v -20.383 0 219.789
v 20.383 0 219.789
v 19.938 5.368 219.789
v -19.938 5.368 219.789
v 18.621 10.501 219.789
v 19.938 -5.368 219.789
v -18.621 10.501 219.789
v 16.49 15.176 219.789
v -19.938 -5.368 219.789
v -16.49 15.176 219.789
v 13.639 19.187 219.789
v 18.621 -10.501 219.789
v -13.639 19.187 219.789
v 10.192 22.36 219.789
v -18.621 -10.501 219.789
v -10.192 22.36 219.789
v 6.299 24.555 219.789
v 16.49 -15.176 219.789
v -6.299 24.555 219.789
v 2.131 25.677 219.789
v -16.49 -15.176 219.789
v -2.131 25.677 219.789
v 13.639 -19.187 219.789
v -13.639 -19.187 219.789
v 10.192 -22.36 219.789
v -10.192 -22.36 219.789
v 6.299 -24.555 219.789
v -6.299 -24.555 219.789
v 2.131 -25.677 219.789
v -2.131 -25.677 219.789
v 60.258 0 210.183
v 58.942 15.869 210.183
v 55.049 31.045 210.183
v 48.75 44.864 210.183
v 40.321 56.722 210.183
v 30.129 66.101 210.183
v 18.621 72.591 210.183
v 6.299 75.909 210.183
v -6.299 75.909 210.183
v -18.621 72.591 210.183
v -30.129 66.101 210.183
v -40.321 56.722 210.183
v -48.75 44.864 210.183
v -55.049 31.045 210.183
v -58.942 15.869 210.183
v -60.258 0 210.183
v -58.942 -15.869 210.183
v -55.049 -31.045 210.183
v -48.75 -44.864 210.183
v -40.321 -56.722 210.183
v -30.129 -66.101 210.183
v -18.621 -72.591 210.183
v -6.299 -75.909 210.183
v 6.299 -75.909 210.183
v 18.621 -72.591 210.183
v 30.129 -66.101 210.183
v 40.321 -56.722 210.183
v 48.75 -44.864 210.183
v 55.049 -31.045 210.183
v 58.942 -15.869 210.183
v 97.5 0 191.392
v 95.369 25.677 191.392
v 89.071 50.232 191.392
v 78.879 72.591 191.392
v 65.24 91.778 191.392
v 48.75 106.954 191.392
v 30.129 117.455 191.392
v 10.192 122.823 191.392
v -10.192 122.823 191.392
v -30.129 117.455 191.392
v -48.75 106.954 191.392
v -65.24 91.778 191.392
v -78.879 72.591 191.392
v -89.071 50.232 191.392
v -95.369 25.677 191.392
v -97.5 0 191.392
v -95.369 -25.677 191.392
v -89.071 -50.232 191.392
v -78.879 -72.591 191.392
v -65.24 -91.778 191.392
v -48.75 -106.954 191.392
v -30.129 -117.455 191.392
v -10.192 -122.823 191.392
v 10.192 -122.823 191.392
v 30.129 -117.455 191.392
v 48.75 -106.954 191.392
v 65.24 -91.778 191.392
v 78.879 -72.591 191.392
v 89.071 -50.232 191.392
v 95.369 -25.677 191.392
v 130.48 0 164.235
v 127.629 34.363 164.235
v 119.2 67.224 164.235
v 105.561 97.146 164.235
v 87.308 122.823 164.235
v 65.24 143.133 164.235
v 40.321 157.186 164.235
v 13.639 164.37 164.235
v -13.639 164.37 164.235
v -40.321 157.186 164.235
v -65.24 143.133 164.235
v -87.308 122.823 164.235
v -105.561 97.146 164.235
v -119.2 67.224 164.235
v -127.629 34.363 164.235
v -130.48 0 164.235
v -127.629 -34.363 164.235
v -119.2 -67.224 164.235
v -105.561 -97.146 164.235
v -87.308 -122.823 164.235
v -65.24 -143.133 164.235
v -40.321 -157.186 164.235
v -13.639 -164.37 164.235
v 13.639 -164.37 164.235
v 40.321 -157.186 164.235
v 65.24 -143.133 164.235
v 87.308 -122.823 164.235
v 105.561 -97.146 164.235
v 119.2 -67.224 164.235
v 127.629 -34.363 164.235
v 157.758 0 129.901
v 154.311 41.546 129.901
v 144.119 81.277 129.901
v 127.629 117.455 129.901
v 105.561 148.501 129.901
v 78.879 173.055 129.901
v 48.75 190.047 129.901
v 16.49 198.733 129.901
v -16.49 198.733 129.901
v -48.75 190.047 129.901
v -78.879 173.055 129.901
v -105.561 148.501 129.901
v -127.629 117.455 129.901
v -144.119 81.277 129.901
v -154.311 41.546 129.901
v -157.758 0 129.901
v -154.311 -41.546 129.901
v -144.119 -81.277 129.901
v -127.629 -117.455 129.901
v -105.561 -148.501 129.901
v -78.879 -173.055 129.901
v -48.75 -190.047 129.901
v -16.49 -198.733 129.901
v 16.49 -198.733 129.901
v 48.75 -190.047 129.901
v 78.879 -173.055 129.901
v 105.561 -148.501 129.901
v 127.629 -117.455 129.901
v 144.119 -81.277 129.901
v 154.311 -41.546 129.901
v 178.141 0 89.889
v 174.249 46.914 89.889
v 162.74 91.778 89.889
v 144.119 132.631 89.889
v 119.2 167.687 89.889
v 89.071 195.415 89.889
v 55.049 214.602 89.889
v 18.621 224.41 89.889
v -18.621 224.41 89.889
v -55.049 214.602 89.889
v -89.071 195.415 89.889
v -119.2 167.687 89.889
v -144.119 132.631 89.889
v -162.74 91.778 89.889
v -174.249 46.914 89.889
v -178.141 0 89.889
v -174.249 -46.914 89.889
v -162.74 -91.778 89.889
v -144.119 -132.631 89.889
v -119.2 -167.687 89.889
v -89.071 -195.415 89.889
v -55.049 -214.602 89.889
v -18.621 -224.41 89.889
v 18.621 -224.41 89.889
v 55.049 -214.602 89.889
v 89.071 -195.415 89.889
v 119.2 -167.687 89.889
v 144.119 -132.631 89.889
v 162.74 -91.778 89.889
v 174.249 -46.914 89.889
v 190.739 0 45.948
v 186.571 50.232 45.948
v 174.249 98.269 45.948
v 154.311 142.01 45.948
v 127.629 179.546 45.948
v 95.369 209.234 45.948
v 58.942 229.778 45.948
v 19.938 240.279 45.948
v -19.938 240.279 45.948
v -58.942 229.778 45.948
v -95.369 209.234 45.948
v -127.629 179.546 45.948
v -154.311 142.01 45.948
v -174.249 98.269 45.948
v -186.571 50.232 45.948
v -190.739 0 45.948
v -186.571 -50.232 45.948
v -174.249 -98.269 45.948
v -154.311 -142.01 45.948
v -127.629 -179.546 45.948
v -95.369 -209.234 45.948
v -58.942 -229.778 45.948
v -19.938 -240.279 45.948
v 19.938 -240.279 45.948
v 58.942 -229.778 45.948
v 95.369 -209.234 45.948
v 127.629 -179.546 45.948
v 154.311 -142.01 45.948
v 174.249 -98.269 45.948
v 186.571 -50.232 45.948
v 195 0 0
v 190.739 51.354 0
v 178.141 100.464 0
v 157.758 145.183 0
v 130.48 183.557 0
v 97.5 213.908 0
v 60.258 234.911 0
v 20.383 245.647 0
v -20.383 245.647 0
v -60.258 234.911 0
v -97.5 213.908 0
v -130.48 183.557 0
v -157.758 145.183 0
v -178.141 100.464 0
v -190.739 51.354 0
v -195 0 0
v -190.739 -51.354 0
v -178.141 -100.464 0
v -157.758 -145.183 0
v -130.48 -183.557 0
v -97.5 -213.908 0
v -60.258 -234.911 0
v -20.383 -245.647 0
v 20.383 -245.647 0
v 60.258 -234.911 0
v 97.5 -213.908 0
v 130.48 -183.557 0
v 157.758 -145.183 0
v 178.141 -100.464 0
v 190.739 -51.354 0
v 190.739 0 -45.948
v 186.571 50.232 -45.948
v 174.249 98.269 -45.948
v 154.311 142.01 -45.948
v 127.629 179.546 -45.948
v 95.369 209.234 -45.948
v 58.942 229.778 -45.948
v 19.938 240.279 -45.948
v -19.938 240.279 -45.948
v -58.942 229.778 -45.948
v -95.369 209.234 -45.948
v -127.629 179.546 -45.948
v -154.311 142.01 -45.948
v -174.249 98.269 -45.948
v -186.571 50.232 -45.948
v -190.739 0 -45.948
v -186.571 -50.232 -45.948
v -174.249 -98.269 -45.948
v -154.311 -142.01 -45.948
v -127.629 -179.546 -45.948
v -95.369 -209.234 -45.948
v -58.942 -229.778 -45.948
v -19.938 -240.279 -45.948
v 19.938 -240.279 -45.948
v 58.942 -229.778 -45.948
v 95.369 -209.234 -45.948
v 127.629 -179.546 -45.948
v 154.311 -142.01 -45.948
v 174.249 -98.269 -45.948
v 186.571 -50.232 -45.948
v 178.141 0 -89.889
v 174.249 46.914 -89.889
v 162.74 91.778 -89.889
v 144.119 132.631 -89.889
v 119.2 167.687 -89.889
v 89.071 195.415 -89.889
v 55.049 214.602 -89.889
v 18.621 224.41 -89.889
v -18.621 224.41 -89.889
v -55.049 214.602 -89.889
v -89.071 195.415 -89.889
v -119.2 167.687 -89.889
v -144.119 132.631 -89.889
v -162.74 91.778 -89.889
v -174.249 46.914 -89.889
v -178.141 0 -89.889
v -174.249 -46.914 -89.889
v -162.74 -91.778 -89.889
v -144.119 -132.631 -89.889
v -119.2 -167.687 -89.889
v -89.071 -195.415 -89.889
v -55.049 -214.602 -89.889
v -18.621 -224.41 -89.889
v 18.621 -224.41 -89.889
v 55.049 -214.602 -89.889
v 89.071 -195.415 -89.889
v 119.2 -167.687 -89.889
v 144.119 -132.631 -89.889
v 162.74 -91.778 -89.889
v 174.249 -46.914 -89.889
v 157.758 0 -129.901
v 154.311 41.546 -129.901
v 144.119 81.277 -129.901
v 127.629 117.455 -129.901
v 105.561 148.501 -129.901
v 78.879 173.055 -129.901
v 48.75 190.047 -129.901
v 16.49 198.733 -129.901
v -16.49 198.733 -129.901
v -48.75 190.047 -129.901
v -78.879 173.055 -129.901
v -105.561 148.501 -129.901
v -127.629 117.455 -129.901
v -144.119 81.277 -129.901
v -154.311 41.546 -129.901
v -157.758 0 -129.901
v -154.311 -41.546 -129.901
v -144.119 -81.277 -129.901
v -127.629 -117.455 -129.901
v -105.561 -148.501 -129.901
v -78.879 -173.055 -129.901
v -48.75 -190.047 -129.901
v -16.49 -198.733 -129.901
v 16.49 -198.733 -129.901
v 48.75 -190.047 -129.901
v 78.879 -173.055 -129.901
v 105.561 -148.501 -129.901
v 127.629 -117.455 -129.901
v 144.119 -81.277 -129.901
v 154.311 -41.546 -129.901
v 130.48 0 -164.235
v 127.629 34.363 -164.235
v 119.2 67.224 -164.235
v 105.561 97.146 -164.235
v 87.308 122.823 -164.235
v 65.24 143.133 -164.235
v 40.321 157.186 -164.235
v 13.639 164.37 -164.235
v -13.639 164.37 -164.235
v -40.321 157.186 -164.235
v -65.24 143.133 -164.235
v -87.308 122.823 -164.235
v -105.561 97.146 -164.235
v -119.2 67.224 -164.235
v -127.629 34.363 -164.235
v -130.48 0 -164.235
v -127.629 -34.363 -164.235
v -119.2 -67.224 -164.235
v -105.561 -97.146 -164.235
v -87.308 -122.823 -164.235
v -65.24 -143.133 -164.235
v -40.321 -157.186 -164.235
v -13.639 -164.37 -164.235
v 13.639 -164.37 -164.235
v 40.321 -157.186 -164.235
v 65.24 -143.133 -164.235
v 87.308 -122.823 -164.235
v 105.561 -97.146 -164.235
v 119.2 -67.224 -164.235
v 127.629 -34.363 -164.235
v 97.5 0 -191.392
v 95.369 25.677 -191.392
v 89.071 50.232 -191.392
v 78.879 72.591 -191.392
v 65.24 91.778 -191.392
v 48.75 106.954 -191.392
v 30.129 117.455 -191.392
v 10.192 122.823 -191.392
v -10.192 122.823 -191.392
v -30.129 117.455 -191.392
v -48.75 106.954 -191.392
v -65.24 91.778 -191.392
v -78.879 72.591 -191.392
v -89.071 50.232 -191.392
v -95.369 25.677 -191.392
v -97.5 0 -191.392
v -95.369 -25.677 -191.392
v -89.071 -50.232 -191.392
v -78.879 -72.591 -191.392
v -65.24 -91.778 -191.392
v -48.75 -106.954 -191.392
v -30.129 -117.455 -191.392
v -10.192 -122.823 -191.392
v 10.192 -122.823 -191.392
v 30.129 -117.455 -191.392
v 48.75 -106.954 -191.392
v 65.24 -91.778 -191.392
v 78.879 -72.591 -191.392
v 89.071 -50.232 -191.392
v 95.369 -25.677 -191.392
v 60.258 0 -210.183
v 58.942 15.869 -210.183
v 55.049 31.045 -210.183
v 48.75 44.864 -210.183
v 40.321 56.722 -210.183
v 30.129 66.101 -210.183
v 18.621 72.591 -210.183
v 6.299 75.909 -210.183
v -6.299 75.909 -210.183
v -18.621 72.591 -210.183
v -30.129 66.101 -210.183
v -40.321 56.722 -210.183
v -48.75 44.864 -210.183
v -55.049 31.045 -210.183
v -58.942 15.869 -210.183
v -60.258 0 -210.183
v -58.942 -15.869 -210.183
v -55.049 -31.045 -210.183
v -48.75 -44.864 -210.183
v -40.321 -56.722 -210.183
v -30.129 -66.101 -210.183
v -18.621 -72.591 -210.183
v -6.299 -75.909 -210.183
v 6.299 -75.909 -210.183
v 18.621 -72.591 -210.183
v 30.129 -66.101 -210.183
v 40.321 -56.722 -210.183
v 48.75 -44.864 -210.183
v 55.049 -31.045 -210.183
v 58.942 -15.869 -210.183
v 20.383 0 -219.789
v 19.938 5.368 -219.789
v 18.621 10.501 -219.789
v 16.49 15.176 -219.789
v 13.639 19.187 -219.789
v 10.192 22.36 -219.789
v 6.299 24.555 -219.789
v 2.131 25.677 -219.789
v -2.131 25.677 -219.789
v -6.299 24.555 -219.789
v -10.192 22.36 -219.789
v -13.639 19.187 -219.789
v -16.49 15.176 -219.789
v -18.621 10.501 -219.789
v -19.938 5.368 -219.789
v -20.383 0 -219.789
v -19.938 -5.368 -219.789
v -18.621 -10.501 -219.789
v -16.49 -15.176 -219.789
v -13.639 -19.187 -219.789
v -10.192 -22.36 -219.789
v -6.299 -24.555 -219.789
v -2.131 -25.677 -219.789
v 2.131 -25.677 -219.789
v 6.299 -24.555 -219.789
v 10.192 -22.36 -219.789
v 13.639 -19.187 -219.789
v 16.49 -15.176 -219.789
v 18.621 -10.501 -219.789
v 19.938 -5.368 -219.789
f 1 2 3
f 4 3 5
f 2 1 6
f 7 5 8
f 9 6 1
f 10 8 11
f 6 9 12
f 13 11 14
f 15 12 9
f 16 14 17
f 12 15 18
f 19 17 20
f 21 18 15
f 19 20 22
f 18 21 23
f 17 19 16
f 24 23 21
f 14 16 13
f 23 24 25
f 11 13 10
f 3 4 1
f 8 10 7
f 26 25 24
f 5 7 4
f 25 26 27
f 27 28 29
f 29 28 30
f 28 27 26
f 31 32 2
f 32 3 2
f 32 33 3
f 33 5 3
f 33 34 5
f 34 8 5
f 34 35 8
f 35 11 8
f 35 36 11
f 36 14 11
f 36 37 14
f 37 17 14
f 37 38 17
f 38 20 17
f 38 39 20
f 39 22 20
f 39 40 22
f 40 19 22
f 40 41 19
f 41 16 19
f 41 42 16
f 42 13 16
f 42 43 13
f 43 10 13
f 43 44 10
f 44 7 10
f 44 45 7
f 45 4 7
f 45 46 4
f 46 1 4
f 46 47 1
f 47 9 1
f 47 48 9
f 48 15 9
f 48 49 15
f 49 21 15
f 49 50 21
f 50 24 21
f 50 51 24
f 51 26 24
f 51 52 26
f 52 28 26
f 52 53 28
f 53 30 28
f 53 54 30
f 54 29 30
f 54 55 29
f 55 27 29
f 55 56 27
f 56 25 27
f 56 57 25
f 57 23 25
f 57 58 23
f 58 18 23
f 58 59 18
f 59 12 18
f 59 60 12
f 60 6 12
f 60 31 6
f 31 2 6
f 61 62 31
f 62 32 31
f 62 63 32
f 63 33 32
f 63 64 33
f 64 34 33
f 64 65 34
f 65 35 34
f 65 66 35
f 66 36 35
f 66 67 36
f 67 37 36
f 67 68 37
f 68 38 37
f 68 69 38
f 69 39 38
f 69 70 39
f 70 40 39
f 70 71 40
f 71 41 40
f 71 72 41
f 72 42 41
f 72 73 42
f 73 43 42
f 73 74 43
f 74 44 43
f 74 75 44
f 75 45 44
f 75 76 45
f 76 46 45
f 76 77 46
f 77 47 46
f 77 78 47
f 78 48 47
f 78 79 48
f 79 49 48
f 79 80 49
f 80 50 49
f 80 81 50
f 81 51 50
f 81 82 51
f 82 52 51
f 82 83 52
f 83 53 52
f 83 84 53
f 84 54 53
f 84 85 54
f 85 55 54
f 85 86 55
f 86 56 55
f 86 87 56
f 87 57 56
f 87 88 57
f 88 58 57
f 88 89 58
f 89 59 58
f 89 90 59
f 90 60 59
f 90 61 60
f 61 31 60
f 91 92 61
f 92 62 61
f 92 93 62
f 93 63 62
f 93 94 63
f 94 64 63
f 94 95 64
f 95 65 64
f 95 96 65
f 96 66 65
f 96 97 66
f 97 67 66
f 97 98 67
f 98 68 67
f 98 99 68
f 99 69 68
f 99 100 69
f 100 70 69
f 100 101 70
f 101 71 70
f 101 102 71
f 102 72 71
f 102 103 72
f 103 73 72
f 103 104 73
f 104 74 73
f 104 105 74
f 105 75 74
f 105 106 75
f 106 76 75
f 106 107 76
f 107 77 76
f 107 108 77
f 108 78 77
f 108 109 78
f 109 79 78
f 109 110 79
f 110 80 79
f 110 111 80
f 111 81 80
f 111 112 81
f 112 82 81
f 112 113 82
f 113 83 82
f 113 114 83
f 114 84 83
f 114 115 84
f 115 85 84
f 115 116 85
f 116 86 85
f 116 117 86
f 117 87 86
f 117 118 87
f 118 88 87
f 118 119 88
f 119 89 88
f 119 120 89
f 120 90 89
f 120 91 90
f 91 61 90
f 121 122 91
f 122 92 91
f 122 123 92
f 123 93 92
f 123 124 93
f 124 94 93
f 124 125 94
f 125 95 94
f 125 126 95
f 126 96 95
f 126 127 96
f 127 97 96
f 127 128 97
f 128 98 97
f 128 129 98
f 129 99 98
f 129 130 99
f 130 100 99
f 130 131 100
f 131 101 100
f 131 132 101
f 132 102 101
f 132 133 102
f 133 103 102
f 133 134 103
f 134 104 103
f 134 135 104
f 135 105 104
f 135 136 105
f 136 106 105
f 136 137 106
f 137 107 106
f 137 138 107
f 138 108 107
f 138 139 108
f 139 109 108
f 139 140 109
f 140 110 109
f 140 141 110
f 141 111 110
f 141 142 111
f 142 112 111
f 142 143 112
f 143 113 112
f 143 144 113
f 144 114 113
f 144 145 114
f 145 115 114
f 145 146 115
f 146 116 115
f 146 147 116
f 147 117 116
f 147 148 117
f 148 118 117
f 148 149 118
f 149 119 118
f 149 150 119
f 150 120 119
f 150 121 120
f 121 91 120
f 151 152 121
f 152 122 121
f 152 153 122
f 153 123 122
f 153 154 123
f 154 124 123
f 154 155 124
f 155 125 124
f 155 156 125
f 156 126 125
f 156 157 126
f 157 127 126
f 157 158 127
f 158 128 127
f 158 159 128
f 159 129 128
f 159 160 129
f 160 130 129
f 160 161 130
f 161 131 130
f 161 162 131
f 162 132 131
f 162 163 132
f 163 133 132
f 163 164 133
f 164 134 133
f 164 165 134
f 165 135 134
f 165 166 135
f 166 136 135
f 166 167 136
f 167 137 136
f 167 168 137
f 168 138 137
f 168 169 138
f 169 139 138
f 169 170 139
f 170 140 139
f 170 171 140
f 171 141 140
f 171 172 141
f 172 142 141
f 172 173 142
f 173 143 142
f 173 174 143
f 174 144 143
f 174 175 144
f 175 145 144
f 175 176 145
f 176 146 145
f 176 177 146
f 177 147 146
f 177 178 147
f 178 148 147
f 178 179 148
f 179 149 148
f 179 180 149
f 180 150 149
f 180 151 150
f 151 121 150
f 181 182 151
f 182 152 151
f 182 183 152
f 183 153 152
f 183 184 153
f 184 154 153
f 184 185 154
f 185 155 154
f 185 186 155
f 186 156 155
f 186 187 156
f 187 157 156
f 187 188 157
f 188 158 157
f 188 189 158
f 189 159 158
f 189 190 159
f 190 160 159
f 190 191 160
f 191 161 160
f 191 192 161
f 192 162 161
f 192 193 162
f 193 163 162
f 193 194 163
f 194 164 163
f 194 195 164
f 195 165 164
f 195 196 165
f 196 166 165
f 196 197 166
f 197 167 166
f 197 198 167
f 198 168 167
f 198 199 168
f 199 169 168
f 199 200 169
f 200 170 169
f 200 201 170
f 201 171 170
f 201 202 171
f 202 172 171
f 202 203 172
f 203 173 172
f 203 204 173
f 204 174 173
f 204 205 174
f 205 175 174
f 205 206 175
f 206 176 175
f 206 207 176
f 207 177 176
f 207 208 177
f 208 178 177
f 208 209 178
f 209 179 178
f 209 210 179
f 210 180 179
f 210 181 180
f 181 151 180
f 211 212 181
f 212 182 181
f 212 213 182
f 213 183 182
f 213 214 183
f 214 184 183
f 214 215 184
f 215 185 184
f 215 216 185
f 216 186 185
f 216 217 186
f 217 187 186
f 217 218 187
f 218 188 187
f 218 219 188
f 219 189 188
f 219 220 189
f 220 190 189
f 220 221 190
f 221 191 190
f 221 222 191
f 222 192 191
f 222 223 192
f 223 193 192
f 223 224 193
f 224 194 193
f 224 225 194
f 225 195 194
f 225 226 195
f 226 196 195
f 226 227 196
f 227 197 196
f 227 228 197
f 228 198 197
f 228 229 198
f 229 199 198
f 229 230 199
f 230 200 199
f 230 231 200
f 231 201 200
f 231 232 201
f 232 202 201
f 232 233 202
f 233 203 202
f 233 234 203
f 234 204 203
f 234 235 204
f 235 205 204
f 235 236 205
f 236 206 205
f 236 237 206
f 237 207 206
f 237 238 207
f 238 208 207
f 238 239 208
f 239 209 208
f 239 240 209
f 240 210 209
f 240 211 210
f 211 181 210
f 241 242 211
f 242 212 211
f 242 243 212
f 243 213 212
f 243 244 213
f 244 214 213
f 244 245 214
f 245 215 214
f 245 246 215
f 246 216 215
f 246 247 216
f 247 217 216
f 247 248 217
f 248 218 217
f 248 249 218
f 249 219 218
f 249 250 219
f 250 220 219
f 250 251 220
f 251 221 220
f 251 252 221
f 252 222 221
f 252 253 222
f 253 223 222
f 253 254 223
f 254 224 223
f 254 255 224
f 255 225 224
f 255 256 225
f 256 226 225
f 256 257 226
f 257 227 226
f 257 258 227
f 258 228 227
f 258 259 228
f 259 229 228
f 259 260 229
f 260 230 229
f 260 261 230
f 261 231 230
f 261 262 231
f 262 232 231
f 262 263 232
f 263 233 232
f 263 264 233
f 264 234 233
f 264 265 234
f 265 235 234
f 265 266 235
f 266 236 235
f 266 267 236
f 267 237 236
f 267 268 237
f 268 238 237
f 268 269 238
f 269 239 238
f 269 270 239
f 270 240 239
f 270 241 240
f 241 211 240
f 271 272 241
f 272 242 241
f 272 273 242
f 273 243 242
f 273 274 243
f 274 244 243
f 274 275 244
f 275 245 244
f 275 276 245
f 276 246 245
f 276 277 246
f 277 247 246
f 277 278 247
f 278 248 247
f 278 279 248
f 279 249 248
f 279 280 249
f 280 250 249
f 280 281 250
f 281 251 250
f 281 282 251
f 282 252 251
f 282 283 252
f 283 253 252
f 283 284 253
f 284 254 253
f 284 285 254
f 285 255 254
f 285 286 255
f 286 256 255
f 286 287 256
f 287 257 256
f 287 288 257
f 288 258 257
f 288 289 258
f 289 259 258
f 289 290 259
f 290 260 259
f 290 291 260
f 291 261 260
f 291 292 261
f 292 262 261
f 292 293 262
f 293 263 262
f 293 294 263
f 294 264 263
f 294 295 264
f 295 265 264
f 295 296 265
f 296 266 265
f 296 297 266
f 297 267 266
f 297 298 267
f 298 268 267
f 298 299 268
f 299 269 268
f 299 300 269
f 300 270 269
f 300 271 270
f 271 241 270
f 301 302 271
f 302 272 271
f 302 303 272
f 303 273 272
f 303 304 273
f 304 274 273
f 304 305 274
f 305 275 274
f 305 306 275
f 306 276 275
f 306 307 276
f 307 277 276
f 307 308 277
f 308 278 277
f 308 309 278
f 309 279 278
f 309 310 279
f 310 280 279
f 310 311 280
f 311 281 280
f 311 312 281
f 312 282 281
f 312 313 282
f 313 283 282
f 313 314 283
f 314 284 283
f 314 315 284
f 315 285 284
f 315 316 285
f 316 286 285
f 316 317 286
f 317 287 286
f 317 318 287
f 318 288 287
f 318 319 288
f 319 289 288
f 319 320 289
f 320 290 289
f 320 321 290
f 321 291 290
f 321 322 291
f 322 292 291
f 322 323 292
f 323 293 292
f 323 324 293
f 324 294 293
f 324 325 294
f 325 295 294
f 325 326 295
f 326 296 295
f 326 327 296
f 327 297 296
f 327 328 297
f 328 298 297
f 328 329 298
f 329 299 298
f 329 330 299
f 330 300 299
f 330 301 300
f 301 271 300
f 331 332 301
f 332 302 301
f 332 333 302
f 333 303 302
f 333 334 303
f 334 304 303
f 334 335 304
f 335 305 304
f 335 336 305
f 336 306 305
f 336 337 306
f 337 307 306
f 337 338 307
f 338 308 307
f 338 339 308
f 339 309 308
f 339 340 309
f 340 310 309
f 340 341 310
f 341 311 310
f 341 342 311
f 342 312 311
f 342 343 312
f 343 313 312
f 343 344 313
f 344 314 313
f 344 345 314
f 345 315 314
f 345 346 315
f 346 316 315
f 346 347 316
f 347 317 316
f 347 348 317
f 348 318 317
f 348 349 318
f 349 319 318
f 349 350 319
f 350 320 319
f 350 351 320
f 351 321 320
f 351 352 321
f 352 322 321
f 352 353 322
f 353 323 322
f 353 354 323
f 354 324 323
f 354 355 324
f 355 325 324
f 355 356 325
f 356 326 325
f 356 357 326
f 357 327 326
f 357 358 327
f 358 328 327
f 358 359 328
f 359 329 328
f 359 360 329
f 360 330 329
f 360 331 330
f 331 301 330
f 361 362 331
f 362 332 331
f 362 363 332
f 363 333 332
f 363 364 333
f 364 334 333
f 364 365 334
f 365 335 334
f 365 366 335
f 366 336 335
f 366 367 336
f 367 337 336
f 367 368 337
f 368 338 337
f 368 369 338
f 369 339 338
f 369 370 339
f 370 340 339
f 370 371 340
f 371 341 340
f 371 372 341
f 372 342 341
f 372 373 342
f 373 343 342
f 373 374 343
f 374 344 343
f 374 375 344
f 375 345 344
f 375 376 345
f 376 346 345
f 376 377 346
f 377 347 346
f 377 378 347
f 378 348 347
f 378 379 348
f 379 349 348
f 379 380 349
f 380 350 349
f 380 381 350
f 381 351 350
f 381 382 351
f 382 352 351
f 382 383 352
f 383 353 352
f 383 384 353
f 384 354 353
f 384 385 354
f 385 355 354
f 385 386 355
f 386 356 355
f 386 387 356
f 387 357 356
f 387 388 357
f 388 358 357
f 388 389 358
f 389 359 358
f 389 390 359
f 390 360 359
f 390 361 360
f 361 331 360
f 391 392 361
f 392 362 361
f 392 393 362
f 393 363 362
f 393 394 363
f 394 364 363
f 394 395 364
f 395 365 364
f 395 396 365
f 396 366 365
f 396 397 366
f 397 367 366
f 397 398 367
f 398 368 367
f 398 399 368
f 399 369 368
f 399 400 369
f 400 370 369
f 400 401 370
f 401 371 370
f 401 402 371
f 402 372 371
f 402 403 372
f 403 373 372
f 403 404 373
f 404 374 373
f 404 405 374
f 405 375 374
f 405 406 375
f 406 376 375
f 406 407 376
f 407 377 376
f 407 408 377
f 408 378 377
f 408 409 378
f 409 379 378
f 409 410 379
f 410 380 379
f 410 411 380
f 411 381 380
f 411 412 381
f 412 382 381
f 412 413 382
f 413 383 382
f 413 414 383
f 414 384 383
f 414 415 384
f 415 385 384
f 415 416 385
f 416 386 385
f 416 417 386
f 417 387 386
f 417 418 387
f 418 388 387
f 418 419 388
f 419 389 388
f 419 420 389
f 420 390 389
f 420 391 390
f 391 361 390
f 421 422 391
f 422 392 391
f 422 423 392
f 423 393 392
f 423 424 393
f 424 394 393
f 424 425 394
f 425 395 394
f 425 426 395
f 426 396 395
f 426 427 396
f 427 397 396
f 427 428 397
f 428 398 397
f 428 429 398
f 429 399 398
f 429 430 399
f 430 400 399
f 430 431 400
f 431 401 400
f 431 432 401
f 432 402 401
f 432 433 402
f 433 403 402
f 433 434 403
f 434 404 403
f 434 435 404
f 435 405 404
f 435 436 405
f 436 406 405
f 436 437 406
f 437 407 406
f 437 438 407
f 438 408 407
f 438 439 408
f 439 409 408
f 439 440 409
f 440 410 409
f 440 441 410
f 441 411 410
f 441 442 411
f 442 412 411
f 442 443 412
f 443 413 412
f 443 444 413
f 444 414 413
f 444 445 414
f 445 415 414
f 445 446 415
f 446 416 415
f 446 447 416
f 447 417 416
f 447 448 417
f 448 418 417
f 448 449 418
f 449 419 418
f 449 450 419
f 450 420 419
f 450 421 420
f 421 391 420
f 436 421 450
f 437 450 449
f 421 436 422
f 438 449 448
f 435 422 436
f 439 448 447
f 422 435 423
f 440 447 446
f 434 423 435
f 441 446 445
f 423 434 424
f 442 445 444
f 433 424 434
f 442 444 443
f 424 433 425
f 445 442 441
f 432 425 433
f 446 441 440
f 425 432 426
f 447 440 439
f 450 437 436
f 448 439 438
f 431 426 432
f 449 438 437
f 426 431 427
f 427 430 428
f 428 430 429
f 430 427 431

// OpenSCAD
// Generated by SolidPython 1.0.1 on 2020-07-29 00:46:52


scale(v = [15, 19, 17]) {
	sphere(r = 13);
}
/***********************************************
*********      SolidPython code:      **********
************************************************
 
# import packages: SolidPython
from solid import *
from solid.utils import *
from itertools import chain, combinations, permutations


class Resize:

    def __init__(self, scad_file):
        self.scad_file = scad_file
        #self.scad_file = import_scad(scad_file)
        # cone/cylinder param:
        self.r1 = 0
        self.r2 = 0
        self.h = 0
        # rectangular prism param:
        self.w = 0
        self.l = 0
        # ellipse param:
        self.r = 0

    # import OpenScad code (file name corresponds to shape)


    # classify shape + parameters
    def assign(self, param1, param2, param3):
        if self.scad_file == 'cone.scad':
            self.r1 = param1
            self.r2 = param2
            self.h = param3
        elif self.scad_file == 'cylinder.scad':
            self.r1 = param1
            self.r2 = param2
            self.h = param3
        elif self.scad_file == 'rectangularPrism.scad':
            self.h = param1
            self.l = param2
            self.w = param3
        else:
            self.r = param1
            self.h = param2

    # resize parameters
    def iterate(self):
        x = range(3, 20, 2)
        i = 1
        if self.scad_file == 'cone.scad':
            tempList = list(permutations(x, 2))
            for temp in tempList:
                param1 = temp[0]
                param2 = temp[1]
                filepath = 'produced_scad_files/' + 'cone' + str(param1) + '_' + str(param2) + '_' + '.scad'
                scad_render_to_file(cylinder(h=param1, r1=param2, r2=0), filepath)

        elif self.scad_file == 'cylinder.scad':
            tempList = list(permutations(x, 3))
            for temp in tempList:
                param1 = temp[0]
                param2 = temp[1]
                filepath = 'produced_scad_files/' + 'cylinder' + str(param1) + '_' + str(param2) + '_' + '.scad'
                scad_render_to_file(cylinder(h=param1, r1=param2, r2=param2), filepath)

        elif self.scad_file == 'rectangularPrism.scad':
            tempList = list(permutations(x, 3))
            for temp in tempList:
                param1 = temp[0]
                param2 = temp[1]
                param3 = temp[2]
                filepath = 'produced_scad_files/' + 'rectangularPrism' + str(param1) + '_' + str(param2) + '_' + str(
                    param3) + '.scad'
                scad_render_to_file(cube(size=(param1, param2, param3)), filepath)

        elif self.scad_file == 'ellipse.scad':
            tempList = list(permutations(x, 4))
            for temp in tempList:
                param1 = temp[0]
                param2 = temp[1]
                param3 = temp[2]
                param4 = temp[3]
                filepath = 'produced_scad_files/' + 'ellipse' + str(param1) + '_' + str(param2) + '_' + str(param3) + '_' + str(param4) + '.scad'
                scad_render_to_file(scale([param1, param2, param3])(sphere(r=param4)), filepath)

    def render_to_scadfile(self):
        scad_render_to_file(scad, 'example.scad') 
 
************************************************/
